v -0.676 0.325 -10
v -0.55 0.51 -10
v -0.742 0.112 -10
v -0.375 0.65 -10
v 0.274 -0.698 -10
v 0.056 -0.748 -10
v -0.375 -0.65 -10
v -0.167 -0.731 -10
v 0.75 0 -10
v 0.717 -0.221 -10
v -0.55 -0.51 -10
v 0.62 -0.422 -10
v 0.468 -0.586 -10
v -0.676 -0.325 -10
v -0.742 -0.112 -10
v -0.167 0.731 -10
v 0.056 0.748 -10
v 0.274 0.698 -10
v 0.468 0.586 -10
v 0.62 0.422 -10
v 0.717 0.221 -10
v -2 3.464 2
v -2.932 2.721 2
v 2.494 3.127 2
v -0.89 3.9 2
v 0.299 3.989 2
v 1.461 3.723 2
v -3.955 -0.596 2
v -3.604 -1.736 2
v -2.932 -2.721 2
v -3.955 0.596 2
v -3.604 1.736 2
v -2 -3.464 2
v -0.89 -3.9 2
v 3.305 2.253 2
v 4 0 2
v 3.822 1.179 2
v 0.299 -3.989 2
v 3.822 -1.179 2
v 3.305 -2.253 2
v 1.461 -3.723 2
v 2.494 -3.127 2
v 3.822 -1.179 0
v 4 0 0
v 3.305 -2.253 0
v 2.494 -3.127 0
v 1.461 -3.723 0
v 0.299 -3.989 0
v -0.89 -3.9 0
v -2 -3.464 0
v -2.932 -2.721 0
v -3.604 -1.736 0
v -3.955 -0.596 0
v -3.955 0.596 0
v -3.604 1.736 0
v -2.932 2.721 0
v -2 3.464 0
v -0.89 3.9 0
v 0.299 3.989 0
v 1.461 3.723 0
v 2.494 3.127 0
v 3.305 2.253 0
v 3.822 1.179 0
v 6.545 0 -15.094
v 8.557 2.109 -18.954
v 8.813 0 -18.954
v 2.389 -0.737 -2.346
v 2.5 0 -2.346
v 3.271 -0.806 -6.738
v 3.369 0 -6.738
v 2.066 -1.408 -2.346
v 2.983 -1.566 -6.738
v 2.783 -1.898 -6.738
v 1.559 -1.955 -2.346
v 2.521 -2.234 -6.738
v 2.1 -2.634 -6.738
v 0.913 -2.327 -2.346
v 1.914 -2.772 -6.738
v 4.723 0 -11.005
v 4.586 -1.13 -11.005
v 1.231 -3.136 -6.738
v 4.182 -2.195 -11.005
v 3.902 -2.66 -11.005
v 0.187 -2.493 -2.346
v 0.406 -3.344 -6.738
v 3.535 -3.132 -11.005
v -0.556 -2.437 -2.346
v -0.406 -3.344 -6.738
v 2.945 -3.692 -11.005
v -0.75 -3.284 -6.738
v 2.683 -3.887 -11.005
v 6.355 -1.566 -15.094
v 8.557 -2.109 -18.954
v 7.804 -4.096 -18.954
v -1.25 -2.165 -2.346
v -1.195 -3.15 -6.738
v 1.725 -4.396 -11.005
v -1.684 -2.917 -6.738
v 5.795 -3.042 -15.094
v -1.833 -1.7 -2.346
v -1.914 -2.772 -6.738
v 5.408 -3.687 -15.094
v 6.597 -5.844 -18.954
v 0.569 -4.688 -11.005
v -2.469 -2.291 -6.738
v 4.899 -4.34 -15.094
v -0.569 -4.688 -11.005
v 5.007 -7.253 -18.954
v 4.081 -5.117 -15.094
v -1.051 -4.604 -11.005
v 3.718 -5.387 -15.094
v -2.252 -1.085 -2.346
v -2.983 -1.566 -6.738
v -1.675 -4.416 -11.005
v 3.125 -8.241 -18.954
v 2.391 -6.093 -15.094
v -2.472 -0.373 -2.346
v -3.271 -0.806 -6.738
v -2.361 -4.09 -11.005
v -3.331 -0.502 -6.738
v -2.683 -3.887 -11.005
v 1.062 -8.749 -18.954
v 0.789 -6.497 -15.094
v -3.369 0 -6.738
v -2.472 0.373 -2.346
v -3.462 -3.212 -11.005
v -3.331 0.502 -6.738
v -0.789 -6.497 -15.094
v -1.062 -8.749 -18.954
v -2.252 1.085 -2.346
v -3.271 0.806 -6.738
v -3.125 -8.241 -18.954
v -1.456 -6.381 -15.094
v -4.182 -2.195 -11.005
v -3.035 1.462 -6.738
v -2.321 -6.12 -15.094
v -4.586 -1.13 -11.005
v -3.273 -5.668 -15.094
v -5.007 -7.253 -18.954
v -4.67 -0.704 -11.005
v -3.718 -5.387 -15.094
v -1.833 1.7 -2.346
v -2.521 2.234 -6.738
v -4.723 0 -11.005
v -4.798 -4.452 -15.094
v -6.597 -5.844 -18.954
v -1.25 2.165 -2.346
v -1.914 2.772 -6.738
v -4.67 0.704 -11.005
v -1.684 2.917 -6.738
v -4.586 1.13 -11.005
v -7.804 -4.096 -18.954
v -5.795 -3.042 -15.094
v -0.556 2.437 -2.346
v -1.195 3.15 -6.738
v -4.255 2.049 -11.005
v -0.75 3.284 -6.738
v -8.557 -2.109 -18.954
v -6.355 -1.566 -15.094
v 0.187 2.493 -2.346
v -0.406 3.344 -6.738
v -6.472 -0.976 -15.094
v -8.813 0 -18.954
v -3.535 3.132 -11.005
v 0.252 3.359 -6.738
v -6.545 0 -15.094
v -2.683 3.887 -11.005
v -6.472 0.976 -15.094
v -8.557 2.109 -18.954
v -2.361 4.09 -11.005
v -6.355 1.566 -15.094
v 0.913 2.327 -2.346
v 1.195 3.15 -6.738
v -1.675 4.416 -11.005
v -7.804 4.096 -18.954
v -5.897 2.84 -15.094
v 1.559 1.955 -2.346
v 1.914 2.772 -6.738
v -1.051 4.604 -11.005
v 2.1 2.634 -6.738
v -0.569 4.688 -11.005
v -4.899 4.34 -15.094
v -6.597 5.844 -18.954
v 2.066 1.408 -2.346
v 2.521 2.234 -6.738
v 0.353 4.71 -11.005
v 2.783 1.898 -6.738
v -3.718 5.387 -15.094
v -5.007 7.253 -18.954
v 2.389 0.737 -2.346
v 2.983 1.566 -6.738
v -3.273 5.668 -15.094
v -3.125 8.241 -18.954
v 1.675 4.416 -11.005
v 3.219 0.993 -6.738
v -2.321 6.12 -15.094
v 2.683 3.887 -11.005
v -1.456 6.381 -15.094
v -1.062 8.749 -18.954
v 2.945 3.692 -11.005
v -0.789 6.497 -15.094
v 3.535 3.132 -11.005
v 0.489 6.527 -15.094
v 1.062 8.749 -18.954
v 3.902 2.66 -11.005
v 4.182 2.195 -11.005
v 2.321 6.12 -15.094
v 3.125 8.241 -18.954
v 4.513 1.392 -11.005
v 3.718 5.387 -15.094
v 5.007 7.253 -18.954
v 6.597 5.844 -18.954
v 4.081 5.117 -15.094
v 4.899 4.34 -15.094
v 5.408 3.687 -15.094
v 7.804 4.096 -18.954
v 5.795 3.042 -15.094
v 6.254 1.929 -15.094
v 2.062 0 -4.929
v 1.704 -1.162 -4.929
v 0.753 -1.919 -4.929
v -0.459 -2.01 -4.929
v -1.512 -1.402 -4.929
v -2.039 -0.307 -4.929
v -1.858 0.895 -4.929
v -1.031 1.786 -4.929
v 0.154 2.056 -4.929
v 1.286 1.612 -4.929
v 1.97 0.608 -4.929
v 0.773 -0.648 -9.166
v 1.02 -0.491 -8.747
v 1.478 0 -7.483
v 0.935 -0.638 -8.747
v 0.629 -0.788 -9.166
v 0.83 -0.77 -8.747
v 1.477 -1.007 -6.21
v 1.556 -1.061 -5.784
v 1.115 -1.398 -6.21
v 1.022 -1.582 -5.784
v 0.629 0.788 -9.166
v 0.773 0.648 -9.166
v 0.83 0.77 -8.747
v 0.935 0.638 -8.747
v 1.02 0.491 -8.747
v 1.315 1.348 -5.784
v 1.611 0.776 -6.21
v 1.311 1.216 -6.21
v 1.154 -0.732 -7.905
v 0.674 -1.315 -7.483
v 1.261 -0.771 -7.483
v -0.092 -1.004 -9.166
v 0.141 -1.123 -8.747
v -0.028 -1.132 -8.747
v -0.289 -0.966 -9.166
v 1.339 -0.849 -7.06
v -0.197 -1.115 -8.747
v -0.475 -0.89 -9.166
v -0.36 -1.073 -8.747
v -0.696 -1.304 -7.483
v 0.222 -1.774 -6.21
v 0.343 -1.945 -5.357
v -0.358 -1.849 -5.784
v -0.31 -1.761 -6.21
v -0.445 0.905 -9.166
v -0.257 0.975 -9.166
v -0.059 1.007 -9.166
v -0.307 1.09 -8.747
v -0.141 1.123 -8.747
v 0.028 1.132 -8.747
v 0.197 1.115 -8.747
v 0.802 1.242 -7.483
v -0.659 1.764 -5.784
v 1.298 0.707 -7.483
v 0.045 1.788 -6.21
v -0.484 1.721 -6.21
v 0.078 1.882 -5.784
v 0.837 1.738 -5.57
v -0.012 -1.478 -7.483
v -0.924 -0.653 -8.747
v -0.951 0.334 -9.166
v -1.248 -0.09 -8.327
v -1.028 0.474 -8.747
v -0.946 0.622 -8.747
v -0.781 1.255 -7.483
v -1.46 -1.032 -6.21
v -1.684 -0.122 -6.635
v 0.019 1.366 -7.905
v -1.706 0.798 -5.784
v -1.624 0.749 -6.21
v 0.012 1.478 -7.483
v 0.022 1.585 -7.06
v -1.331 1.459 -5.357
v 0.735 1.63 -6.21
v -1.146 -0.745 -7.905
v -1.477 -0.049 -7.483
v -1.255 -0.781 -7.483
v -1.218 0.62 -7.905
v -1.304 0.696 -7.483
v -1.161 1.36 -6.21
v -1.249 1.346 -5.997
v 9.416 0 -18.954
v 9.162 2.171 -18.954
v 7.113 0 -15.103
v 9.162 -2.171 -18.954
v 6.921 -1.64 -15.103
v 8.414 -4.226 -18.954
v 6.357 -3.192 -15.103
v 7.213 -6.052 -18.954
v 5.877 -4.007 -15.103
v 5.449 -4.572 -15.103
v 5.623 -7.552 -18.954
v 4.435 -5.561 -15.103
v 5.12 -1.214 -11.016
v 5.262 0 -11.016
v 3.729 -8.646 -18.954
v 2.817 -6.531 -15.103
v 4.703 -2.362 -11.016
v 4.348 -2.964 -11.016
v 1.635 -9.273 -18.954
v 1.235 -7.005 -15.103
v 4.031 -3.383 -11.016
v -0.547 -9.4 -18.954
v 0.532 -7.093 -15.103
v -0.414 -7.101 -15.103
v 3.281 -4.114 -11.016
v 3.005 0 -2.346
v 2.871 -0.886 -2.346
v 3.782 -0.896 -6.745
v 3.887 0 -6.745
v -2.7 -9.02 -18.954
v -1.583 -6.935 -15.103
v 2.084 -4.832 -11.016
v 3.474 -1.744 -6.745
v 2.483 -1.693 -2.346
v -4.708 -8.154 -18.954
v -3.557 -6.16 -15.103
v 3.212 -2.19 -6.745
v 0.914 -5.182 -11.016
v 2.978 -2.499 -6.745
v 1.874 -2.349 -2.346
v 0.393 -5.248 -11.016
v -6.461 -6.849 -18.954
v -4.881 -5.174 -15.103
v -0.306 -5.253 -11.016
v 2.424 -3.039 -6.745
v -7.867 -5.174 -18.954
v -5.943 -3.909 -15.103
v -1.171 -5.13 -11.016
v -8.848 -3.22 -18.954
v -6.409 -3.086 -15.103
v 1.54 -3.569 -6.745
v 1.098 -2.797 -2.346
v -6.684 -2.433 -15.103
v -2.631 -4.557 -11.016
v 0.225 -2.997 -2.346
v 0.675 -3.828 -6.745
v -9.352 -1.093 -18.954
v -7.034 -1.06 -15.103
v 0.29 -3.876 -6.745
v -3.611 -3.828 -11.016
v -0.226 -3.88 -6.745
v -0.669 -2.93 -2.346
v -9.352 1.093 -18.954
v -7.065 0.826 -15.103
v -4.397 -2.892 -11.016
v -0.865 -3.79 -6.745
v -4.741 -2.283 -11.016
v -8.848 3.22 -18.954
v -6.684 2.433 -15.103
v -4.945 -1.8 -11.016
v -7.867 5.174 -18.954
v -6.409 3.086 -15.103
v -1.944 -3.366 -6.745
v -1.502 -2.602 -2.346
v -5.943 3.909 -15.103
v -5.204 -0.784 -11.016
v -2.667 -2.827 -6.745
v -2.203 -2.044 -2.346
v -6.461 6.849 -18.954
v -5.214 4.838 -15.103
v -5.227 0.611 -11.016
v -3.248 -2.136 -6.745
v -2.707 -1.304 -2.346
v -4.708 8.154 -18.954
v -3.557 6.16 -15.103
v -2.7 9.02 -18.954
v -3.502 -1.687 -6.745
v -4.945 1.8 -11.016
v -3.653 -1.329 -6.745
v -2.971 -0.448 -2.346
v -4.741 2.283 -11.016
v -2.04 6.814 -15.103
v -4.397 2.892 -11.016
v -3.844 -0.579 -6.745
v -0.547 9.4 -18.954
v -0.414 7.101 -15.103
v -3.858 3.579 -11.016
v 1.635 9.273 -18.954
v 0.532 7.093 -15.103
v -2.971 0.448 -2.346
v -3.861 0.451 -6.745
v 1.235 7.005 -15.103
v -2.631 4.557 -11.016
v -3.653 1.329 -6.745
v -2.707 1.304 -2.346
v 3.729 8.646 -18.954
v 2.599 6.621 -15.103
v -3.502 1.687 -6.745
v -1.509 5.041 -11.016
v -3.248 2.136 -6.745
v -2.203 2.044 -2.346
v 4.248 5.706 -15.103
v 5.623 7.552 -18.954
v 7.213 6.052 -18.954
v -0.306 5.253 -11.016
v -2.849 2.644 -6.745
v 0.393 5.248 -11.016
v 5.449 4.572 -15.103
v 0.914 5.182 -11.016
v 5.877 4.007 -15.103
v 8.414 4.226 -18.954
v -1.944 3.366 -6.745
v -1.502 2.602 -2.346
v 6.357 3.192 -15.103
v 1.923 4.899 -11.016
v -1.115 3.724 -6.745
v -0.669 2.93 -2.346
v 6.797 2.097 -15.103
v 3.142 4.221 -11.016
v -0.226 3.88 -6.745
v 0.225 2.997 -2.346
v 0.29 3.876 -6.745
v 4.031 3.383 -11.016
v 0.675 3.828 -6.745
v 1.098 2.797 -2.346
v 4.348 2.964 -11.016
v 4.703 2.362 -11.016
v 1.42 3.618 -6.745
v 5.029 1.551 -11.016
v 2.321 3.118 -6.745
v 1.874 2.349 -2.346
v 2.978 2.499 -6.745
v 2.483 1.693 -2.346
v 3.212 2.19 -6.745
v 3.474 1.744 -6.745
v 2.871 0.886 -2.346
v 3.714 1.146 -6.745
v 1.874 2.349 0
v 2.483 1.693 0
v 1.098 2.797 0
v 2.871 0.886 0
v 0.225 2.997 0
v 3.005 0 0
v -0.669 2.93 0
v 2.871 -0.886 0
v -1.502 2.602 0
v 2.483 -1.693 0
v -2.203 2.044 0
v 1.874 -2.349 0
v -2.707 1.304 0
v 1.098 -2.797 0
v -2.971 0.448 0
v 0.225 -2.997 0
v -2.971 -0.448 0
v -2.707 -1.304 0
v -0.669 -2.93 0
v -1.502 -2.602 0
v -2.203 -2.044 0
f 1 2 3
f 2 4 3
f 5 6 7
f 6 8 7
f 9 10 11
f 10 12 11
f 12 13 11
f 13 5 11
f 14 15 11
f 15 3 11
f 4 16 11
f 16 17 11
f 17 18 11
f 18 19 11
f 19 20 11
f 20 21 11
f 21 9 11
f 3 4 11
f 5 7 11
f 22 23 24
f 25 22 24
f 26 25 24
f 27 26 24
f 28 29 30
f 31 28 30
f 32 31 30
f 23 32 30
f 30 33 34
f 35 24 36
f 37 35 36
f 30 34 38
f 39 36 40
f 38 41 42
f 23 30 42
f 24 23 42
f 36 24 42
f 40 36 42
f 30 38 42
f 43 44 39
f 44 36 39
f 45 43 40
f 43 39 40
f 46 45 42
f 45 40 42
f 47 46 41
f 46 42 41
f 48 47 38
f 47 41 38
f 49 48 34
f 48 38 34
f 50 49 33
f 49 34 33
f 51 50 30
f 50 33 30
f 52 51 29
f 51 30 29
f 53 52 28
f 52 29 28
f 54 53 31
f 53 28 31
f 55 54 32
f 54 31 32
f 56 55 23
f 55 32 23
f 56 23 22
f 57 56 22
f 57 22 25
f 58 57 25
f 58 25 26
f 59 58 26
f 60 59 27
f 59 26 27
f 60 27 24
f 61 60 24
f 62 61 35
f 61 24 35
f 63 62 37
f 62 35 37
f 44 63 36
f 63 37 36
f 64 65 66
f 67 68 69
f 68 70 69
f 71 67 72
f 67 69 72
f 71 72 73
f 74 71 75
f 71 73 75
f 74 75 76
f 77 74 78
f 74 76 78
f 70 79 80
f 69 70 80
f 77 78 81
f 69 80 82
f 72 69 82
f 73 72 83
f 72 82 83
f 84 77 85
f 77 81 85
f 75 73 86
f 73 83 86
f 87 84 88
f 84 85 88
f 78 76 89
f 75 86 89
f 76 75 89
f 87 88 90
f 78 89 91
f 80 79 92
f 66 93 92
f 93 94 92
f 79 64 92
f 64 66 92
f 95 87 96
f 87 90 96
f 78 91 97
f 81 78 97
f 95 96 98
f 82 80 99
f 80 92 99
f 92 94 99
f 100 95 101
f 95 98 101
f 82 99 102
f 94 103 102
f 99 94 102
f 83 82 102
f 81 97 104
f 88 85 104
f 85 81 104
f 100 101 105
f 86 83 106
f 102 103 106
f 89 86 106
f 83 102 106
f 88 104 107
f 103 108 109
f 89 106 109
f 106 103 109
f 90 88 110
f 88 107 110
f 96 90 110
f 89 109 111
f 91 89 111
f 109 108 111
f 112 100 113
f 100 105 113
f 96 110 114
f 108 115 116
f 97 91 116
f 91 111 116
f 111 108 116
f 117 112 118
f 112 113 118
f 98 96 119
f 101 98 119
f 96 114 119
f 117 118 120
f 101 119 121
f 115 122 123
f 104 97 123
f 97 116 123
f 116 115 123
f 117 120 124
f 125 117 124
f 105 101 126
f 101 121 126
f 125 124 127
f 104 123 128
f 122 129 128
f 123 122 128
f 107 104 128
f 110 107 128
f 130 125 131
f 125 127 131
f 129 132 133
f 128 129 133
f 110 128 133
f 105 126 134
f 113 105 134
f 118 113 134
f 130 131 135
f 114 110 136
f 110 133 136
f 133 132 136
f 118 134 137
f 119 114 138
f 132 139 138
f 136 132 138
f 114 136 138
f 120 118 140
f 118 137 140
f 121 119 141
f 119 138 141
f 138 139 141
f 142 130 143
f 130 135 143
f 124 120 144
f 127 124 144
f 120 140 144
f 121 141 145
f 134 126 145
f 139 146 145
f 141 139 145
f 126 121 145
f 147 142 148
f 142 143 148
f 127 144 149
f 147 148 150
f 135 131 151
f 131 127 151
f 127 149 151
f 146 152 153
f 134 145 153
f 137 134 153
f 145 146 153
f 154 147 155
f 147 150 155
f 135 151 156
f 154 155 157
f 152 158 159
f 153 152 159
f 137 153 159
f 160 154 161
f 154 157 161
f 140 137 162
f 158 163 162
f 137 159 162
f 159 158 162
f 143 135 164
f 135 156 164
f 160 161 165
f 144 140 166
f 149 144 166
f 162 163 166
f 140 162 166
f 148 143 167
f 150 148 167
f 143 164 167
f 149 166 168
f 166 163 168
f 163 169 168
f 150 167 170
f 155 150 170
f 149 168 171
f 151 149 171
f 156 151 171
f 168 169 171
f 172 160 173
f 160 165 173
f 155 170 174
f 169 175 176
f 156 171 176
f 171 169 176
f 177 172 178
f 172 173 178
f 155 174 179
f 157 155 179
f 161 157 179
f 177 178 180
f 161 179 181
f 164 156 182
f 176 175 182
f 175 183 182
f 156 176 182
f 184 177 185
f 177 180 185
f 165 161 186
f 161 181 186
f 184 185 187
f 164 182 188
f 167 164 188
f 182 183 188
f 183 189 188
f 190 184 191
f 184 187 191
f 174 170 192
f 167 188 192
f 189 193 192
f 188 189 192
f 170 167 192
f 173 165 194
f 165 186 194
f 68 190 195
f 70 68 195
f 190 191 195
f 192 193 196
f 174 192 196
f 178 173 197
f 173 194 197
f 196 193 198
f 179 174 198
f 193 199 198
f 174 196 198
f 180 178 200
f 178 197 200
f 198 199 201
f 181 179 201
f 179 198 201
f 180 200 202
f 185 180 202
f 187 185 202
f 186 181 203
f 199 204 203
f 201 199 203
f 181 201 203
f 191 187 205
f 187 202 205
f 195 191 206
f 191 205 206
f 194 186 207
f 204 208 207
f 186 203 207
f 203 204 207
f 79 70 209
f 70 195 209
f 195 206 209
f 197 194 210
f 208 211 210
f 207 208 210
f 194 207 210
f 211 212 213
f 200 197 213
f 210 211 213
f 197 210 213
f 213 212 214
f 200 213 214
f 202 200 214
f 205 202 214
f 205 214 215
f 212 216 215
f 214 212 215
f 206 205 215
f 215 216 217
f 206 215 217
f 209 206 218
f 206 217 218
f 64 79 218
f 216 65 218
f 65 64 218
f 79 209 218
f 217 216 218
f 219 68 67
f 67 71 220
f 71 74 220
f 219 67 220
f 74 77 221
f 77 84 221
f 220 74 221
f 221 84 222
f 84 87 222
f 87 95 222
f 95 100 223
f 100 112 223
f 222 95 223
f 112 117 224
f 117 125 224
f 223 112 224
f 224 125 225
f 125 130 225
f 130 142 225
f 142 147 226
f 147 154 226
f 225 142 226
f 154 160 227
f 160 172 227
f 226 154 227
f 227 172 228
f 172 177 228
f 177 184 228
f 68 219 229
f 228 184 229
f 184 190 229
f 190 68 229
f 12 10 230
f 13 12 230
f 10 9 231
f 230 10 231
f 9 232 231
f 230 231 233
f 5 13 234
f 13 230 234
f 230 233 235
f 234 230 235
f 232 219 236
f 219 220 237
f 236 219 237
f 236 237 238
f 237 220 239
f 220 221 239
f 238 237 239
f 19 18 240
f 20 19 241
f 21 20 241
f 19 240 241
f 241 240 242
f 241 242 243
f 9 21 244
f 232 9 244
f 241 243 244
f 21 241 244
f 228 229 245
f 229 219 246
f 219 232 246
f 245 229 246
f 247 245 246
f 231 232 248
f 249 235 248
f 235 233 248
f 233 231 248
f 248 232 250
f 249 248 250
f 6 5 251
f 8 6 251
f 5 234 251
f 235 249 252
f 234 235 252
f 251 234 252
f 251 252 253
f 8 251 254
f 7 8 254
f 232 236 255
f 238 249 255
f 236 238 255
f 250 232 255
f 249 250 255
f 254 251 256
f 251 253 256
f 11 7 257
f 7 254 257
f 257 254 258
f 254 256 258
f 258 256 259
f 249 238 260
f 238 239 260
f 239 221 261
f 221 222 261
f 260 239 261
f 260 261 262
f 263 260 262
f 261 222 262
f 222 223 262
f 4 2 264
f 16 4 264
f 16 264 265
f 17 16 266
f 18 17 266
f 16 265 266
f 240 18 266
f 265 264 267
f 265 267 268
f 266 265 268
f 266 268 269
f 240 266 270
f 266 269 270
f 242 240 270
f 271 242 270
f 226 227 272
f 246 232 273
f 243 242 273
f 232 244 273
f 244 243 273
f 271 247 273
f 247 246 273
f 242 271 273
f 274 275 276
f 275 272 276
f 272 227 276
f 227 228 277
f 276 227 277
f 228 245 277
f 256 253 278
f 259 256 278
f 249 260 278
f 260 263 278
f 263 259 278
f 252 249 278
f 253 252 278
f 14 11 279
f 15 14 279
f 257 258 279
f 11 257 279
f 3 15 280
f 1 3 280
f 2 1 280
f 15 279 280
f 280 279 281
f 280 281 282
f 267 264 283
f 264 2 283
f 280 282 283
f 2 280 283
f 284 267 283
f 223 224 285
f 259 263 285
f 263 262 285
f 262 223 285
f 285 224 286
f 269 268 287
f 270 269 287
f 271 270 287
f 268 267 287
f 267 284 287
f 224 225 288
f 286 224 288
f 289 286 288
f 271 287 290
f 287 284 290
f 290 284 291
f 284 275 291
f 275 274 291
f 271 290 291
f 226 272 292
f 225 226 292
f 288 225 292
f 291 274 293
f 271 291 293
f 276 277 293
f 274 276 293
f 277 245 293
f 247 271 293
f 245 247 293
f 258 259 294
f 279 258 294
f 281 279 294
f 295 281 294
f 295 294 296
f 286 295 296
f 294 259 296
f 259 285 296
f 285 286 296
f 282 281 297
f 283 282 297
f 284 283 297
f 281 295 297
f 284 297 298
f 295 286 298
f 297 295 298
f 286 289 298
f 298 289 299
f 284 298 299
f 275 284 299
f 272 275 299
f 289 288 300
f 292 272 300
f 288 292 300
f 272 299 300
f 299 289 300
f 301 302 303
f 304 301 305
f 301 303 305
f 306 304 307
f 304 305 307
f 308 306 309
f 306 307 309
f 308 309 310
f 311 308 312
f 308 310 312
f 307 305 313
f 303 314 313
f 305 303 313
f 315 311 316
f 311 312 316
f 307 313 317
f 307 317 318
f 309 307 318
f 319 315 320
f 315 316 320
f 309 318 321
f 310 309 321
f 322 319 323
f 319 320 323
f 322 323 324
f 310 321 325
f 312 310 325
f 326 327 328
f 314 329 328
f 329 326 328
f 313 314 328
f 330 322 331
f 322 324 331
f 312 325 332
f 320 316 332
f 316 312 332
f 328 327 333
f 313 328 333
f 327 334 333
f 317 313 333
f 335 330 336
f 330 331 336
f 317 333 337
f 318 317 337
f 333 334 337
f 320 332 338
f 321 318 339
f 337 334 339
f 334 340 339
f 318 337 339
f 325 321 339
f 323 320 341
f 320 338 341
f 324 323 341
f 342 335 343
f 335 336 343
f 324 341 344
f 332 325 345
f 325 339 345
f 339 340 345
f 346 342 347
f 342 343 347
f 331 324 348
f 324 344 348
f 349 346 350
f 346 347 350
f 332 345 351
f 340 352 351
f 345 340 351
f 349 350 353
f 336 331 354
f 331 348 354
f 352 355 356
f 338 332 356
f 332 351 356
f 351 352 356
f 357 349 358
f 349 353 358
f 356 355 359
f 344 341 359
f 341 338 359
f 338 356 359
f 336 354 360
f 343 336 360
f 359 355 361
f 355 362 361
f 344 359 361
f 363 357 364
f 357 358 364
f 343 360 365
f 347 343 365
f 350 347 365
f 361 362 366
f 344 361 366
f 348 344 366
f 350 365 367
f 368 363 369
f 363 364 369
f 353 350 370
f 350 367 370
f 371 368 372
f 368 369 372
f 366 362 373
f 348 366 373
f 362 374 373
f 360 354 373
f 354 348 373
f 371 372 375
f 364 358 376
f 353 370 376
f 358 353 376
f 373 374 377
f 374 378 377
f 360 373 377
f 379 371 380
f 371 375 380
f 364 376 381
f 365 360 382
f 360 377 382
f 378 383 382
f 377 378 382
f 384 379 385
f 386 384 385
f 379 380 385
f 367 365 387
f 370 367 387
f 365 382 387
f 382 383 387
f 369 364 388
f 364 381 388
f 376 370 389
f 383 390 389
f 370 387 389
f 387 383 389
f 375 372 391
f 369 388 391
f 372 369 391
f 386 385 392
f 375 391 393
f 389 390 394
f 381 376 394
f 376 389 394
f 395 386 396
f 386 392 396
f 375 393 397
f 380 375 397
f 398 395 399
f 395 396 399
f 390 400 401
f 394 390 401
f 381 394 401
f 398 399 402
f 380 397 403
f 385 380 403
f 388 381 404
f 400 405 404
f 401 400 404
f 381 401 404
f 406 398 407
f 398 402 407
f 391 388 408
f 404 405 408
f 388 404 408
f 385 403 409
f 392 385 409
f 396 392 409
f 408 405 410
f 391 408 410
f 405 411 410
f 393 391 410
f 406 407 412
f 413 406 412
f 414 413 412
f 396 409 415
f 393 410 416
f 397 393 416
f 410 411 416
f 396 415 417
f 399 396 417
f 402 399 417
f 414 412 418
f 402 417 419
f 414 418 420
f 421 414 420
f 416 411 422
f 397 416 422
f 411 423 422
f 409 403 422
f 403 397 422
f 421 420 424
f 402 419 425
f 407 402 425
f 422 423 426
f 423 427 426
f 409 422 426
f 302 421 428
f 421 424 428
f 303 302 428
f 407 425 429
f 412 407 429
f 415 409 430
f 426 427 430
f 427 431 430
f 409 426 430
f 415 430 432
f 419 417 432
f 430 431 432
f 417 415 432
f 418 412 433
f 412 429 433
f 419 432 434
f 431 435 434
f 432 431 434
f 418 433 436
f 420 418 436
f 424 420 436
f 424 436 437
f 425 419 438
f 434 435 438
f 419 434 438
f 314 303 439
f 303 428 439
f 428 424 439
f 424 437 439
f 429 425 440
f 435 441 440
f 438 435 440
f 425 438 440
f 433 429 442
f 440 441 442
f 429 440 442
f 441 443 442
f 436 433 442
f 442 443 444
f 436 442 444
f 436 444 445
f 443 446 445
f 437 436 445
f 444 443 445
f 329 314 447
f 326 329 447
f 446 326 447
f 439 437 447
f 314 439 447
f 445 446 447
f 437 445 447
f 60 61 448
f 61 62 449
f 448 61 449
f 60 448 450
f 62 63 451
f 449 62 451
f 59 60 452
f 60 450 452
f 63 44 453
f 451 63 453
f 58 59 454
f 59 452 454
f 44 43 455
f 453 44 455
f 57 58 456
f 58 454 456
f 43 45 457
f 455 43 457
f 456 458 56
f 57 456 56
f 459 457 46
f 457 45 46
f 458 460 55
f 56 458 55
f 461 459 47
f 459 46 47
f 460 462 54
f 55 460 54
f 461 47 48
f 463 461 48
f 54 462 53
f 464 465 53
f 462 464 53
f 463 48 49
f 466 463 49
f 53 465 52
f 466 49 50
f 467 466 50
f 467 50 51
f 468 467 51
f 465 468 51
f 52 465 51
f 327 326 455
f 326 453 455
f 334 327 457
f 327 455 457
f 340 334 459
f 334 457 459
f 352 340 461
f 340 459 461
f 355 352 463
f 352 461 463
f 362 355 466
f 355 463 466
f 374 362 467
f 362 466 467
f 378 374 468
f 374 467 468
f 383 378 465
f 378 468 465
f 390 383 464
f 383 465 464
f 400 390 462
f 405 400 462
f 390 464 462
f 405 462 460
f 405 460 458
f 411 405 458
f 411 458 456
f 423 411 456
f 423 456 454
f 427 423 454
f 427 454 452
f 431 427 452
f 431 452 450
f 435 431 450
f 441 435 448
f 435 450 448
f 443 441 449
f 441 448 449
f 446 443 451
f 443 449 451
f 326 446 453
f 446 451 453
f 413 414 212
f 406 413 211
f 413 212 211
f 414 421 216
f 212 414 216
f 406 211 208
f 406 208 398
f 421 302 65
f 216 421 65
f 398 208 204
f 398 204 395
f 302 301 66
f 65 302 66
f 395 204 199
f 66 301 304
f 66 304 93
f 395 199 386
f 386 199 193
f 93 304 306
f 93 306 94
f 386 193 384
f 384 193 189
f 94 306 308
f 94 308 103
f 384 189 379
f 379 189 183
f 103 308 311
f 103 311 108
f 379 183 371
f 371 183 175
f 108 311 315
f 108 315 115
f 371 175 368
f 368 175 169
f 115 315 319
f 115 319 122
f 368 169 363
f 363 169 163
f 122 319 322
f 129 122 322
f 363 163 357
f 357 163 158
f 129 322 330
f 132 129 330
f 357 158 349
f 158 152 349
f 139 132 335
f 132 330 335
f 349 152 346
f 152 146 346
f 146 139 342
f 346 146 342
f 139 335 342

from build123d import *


with BuildPart() as part:
    # Sketch1 → Revolve2 (revolve)
    with BuildSketch(Plane(origin=(0, 0, 0), x_dir=(1, 0, 0), z_dir=(0, 1, 0))):
        with BuildLine():
            ThreePointArc((9.415562128, 18.954471585), (5.262334896, 11.015891219), (3.004951609, 2.345563927))
            Line((3.004951609, 2.345563927), (3.004951609, 0))
            Line((3.004951609, 0), (4, 0))
            Line((4, 0), (4, -2))
            Line((4, -2), (0, -2))
            Line((0, -2), (0, 0))
            Line((0, 0), (0, 10))
            Line((0, 10), (0.75, 10))
            ThreePointArc((0.75, 10), (1.788096318, 6.210069956), (2.5, 2.345563927))
            ThreePointArc((2.5, 2.345563927), (4.722740089, 11.005000833), (8.813257881, 18.954471585))
            Line((8.813257881, 18.954471585), (9.415562128, 18.954471585))
        make_face()
    revolve(axis=Axis((0, 0, 2), (0, 0, -1)))


solid = part.part
